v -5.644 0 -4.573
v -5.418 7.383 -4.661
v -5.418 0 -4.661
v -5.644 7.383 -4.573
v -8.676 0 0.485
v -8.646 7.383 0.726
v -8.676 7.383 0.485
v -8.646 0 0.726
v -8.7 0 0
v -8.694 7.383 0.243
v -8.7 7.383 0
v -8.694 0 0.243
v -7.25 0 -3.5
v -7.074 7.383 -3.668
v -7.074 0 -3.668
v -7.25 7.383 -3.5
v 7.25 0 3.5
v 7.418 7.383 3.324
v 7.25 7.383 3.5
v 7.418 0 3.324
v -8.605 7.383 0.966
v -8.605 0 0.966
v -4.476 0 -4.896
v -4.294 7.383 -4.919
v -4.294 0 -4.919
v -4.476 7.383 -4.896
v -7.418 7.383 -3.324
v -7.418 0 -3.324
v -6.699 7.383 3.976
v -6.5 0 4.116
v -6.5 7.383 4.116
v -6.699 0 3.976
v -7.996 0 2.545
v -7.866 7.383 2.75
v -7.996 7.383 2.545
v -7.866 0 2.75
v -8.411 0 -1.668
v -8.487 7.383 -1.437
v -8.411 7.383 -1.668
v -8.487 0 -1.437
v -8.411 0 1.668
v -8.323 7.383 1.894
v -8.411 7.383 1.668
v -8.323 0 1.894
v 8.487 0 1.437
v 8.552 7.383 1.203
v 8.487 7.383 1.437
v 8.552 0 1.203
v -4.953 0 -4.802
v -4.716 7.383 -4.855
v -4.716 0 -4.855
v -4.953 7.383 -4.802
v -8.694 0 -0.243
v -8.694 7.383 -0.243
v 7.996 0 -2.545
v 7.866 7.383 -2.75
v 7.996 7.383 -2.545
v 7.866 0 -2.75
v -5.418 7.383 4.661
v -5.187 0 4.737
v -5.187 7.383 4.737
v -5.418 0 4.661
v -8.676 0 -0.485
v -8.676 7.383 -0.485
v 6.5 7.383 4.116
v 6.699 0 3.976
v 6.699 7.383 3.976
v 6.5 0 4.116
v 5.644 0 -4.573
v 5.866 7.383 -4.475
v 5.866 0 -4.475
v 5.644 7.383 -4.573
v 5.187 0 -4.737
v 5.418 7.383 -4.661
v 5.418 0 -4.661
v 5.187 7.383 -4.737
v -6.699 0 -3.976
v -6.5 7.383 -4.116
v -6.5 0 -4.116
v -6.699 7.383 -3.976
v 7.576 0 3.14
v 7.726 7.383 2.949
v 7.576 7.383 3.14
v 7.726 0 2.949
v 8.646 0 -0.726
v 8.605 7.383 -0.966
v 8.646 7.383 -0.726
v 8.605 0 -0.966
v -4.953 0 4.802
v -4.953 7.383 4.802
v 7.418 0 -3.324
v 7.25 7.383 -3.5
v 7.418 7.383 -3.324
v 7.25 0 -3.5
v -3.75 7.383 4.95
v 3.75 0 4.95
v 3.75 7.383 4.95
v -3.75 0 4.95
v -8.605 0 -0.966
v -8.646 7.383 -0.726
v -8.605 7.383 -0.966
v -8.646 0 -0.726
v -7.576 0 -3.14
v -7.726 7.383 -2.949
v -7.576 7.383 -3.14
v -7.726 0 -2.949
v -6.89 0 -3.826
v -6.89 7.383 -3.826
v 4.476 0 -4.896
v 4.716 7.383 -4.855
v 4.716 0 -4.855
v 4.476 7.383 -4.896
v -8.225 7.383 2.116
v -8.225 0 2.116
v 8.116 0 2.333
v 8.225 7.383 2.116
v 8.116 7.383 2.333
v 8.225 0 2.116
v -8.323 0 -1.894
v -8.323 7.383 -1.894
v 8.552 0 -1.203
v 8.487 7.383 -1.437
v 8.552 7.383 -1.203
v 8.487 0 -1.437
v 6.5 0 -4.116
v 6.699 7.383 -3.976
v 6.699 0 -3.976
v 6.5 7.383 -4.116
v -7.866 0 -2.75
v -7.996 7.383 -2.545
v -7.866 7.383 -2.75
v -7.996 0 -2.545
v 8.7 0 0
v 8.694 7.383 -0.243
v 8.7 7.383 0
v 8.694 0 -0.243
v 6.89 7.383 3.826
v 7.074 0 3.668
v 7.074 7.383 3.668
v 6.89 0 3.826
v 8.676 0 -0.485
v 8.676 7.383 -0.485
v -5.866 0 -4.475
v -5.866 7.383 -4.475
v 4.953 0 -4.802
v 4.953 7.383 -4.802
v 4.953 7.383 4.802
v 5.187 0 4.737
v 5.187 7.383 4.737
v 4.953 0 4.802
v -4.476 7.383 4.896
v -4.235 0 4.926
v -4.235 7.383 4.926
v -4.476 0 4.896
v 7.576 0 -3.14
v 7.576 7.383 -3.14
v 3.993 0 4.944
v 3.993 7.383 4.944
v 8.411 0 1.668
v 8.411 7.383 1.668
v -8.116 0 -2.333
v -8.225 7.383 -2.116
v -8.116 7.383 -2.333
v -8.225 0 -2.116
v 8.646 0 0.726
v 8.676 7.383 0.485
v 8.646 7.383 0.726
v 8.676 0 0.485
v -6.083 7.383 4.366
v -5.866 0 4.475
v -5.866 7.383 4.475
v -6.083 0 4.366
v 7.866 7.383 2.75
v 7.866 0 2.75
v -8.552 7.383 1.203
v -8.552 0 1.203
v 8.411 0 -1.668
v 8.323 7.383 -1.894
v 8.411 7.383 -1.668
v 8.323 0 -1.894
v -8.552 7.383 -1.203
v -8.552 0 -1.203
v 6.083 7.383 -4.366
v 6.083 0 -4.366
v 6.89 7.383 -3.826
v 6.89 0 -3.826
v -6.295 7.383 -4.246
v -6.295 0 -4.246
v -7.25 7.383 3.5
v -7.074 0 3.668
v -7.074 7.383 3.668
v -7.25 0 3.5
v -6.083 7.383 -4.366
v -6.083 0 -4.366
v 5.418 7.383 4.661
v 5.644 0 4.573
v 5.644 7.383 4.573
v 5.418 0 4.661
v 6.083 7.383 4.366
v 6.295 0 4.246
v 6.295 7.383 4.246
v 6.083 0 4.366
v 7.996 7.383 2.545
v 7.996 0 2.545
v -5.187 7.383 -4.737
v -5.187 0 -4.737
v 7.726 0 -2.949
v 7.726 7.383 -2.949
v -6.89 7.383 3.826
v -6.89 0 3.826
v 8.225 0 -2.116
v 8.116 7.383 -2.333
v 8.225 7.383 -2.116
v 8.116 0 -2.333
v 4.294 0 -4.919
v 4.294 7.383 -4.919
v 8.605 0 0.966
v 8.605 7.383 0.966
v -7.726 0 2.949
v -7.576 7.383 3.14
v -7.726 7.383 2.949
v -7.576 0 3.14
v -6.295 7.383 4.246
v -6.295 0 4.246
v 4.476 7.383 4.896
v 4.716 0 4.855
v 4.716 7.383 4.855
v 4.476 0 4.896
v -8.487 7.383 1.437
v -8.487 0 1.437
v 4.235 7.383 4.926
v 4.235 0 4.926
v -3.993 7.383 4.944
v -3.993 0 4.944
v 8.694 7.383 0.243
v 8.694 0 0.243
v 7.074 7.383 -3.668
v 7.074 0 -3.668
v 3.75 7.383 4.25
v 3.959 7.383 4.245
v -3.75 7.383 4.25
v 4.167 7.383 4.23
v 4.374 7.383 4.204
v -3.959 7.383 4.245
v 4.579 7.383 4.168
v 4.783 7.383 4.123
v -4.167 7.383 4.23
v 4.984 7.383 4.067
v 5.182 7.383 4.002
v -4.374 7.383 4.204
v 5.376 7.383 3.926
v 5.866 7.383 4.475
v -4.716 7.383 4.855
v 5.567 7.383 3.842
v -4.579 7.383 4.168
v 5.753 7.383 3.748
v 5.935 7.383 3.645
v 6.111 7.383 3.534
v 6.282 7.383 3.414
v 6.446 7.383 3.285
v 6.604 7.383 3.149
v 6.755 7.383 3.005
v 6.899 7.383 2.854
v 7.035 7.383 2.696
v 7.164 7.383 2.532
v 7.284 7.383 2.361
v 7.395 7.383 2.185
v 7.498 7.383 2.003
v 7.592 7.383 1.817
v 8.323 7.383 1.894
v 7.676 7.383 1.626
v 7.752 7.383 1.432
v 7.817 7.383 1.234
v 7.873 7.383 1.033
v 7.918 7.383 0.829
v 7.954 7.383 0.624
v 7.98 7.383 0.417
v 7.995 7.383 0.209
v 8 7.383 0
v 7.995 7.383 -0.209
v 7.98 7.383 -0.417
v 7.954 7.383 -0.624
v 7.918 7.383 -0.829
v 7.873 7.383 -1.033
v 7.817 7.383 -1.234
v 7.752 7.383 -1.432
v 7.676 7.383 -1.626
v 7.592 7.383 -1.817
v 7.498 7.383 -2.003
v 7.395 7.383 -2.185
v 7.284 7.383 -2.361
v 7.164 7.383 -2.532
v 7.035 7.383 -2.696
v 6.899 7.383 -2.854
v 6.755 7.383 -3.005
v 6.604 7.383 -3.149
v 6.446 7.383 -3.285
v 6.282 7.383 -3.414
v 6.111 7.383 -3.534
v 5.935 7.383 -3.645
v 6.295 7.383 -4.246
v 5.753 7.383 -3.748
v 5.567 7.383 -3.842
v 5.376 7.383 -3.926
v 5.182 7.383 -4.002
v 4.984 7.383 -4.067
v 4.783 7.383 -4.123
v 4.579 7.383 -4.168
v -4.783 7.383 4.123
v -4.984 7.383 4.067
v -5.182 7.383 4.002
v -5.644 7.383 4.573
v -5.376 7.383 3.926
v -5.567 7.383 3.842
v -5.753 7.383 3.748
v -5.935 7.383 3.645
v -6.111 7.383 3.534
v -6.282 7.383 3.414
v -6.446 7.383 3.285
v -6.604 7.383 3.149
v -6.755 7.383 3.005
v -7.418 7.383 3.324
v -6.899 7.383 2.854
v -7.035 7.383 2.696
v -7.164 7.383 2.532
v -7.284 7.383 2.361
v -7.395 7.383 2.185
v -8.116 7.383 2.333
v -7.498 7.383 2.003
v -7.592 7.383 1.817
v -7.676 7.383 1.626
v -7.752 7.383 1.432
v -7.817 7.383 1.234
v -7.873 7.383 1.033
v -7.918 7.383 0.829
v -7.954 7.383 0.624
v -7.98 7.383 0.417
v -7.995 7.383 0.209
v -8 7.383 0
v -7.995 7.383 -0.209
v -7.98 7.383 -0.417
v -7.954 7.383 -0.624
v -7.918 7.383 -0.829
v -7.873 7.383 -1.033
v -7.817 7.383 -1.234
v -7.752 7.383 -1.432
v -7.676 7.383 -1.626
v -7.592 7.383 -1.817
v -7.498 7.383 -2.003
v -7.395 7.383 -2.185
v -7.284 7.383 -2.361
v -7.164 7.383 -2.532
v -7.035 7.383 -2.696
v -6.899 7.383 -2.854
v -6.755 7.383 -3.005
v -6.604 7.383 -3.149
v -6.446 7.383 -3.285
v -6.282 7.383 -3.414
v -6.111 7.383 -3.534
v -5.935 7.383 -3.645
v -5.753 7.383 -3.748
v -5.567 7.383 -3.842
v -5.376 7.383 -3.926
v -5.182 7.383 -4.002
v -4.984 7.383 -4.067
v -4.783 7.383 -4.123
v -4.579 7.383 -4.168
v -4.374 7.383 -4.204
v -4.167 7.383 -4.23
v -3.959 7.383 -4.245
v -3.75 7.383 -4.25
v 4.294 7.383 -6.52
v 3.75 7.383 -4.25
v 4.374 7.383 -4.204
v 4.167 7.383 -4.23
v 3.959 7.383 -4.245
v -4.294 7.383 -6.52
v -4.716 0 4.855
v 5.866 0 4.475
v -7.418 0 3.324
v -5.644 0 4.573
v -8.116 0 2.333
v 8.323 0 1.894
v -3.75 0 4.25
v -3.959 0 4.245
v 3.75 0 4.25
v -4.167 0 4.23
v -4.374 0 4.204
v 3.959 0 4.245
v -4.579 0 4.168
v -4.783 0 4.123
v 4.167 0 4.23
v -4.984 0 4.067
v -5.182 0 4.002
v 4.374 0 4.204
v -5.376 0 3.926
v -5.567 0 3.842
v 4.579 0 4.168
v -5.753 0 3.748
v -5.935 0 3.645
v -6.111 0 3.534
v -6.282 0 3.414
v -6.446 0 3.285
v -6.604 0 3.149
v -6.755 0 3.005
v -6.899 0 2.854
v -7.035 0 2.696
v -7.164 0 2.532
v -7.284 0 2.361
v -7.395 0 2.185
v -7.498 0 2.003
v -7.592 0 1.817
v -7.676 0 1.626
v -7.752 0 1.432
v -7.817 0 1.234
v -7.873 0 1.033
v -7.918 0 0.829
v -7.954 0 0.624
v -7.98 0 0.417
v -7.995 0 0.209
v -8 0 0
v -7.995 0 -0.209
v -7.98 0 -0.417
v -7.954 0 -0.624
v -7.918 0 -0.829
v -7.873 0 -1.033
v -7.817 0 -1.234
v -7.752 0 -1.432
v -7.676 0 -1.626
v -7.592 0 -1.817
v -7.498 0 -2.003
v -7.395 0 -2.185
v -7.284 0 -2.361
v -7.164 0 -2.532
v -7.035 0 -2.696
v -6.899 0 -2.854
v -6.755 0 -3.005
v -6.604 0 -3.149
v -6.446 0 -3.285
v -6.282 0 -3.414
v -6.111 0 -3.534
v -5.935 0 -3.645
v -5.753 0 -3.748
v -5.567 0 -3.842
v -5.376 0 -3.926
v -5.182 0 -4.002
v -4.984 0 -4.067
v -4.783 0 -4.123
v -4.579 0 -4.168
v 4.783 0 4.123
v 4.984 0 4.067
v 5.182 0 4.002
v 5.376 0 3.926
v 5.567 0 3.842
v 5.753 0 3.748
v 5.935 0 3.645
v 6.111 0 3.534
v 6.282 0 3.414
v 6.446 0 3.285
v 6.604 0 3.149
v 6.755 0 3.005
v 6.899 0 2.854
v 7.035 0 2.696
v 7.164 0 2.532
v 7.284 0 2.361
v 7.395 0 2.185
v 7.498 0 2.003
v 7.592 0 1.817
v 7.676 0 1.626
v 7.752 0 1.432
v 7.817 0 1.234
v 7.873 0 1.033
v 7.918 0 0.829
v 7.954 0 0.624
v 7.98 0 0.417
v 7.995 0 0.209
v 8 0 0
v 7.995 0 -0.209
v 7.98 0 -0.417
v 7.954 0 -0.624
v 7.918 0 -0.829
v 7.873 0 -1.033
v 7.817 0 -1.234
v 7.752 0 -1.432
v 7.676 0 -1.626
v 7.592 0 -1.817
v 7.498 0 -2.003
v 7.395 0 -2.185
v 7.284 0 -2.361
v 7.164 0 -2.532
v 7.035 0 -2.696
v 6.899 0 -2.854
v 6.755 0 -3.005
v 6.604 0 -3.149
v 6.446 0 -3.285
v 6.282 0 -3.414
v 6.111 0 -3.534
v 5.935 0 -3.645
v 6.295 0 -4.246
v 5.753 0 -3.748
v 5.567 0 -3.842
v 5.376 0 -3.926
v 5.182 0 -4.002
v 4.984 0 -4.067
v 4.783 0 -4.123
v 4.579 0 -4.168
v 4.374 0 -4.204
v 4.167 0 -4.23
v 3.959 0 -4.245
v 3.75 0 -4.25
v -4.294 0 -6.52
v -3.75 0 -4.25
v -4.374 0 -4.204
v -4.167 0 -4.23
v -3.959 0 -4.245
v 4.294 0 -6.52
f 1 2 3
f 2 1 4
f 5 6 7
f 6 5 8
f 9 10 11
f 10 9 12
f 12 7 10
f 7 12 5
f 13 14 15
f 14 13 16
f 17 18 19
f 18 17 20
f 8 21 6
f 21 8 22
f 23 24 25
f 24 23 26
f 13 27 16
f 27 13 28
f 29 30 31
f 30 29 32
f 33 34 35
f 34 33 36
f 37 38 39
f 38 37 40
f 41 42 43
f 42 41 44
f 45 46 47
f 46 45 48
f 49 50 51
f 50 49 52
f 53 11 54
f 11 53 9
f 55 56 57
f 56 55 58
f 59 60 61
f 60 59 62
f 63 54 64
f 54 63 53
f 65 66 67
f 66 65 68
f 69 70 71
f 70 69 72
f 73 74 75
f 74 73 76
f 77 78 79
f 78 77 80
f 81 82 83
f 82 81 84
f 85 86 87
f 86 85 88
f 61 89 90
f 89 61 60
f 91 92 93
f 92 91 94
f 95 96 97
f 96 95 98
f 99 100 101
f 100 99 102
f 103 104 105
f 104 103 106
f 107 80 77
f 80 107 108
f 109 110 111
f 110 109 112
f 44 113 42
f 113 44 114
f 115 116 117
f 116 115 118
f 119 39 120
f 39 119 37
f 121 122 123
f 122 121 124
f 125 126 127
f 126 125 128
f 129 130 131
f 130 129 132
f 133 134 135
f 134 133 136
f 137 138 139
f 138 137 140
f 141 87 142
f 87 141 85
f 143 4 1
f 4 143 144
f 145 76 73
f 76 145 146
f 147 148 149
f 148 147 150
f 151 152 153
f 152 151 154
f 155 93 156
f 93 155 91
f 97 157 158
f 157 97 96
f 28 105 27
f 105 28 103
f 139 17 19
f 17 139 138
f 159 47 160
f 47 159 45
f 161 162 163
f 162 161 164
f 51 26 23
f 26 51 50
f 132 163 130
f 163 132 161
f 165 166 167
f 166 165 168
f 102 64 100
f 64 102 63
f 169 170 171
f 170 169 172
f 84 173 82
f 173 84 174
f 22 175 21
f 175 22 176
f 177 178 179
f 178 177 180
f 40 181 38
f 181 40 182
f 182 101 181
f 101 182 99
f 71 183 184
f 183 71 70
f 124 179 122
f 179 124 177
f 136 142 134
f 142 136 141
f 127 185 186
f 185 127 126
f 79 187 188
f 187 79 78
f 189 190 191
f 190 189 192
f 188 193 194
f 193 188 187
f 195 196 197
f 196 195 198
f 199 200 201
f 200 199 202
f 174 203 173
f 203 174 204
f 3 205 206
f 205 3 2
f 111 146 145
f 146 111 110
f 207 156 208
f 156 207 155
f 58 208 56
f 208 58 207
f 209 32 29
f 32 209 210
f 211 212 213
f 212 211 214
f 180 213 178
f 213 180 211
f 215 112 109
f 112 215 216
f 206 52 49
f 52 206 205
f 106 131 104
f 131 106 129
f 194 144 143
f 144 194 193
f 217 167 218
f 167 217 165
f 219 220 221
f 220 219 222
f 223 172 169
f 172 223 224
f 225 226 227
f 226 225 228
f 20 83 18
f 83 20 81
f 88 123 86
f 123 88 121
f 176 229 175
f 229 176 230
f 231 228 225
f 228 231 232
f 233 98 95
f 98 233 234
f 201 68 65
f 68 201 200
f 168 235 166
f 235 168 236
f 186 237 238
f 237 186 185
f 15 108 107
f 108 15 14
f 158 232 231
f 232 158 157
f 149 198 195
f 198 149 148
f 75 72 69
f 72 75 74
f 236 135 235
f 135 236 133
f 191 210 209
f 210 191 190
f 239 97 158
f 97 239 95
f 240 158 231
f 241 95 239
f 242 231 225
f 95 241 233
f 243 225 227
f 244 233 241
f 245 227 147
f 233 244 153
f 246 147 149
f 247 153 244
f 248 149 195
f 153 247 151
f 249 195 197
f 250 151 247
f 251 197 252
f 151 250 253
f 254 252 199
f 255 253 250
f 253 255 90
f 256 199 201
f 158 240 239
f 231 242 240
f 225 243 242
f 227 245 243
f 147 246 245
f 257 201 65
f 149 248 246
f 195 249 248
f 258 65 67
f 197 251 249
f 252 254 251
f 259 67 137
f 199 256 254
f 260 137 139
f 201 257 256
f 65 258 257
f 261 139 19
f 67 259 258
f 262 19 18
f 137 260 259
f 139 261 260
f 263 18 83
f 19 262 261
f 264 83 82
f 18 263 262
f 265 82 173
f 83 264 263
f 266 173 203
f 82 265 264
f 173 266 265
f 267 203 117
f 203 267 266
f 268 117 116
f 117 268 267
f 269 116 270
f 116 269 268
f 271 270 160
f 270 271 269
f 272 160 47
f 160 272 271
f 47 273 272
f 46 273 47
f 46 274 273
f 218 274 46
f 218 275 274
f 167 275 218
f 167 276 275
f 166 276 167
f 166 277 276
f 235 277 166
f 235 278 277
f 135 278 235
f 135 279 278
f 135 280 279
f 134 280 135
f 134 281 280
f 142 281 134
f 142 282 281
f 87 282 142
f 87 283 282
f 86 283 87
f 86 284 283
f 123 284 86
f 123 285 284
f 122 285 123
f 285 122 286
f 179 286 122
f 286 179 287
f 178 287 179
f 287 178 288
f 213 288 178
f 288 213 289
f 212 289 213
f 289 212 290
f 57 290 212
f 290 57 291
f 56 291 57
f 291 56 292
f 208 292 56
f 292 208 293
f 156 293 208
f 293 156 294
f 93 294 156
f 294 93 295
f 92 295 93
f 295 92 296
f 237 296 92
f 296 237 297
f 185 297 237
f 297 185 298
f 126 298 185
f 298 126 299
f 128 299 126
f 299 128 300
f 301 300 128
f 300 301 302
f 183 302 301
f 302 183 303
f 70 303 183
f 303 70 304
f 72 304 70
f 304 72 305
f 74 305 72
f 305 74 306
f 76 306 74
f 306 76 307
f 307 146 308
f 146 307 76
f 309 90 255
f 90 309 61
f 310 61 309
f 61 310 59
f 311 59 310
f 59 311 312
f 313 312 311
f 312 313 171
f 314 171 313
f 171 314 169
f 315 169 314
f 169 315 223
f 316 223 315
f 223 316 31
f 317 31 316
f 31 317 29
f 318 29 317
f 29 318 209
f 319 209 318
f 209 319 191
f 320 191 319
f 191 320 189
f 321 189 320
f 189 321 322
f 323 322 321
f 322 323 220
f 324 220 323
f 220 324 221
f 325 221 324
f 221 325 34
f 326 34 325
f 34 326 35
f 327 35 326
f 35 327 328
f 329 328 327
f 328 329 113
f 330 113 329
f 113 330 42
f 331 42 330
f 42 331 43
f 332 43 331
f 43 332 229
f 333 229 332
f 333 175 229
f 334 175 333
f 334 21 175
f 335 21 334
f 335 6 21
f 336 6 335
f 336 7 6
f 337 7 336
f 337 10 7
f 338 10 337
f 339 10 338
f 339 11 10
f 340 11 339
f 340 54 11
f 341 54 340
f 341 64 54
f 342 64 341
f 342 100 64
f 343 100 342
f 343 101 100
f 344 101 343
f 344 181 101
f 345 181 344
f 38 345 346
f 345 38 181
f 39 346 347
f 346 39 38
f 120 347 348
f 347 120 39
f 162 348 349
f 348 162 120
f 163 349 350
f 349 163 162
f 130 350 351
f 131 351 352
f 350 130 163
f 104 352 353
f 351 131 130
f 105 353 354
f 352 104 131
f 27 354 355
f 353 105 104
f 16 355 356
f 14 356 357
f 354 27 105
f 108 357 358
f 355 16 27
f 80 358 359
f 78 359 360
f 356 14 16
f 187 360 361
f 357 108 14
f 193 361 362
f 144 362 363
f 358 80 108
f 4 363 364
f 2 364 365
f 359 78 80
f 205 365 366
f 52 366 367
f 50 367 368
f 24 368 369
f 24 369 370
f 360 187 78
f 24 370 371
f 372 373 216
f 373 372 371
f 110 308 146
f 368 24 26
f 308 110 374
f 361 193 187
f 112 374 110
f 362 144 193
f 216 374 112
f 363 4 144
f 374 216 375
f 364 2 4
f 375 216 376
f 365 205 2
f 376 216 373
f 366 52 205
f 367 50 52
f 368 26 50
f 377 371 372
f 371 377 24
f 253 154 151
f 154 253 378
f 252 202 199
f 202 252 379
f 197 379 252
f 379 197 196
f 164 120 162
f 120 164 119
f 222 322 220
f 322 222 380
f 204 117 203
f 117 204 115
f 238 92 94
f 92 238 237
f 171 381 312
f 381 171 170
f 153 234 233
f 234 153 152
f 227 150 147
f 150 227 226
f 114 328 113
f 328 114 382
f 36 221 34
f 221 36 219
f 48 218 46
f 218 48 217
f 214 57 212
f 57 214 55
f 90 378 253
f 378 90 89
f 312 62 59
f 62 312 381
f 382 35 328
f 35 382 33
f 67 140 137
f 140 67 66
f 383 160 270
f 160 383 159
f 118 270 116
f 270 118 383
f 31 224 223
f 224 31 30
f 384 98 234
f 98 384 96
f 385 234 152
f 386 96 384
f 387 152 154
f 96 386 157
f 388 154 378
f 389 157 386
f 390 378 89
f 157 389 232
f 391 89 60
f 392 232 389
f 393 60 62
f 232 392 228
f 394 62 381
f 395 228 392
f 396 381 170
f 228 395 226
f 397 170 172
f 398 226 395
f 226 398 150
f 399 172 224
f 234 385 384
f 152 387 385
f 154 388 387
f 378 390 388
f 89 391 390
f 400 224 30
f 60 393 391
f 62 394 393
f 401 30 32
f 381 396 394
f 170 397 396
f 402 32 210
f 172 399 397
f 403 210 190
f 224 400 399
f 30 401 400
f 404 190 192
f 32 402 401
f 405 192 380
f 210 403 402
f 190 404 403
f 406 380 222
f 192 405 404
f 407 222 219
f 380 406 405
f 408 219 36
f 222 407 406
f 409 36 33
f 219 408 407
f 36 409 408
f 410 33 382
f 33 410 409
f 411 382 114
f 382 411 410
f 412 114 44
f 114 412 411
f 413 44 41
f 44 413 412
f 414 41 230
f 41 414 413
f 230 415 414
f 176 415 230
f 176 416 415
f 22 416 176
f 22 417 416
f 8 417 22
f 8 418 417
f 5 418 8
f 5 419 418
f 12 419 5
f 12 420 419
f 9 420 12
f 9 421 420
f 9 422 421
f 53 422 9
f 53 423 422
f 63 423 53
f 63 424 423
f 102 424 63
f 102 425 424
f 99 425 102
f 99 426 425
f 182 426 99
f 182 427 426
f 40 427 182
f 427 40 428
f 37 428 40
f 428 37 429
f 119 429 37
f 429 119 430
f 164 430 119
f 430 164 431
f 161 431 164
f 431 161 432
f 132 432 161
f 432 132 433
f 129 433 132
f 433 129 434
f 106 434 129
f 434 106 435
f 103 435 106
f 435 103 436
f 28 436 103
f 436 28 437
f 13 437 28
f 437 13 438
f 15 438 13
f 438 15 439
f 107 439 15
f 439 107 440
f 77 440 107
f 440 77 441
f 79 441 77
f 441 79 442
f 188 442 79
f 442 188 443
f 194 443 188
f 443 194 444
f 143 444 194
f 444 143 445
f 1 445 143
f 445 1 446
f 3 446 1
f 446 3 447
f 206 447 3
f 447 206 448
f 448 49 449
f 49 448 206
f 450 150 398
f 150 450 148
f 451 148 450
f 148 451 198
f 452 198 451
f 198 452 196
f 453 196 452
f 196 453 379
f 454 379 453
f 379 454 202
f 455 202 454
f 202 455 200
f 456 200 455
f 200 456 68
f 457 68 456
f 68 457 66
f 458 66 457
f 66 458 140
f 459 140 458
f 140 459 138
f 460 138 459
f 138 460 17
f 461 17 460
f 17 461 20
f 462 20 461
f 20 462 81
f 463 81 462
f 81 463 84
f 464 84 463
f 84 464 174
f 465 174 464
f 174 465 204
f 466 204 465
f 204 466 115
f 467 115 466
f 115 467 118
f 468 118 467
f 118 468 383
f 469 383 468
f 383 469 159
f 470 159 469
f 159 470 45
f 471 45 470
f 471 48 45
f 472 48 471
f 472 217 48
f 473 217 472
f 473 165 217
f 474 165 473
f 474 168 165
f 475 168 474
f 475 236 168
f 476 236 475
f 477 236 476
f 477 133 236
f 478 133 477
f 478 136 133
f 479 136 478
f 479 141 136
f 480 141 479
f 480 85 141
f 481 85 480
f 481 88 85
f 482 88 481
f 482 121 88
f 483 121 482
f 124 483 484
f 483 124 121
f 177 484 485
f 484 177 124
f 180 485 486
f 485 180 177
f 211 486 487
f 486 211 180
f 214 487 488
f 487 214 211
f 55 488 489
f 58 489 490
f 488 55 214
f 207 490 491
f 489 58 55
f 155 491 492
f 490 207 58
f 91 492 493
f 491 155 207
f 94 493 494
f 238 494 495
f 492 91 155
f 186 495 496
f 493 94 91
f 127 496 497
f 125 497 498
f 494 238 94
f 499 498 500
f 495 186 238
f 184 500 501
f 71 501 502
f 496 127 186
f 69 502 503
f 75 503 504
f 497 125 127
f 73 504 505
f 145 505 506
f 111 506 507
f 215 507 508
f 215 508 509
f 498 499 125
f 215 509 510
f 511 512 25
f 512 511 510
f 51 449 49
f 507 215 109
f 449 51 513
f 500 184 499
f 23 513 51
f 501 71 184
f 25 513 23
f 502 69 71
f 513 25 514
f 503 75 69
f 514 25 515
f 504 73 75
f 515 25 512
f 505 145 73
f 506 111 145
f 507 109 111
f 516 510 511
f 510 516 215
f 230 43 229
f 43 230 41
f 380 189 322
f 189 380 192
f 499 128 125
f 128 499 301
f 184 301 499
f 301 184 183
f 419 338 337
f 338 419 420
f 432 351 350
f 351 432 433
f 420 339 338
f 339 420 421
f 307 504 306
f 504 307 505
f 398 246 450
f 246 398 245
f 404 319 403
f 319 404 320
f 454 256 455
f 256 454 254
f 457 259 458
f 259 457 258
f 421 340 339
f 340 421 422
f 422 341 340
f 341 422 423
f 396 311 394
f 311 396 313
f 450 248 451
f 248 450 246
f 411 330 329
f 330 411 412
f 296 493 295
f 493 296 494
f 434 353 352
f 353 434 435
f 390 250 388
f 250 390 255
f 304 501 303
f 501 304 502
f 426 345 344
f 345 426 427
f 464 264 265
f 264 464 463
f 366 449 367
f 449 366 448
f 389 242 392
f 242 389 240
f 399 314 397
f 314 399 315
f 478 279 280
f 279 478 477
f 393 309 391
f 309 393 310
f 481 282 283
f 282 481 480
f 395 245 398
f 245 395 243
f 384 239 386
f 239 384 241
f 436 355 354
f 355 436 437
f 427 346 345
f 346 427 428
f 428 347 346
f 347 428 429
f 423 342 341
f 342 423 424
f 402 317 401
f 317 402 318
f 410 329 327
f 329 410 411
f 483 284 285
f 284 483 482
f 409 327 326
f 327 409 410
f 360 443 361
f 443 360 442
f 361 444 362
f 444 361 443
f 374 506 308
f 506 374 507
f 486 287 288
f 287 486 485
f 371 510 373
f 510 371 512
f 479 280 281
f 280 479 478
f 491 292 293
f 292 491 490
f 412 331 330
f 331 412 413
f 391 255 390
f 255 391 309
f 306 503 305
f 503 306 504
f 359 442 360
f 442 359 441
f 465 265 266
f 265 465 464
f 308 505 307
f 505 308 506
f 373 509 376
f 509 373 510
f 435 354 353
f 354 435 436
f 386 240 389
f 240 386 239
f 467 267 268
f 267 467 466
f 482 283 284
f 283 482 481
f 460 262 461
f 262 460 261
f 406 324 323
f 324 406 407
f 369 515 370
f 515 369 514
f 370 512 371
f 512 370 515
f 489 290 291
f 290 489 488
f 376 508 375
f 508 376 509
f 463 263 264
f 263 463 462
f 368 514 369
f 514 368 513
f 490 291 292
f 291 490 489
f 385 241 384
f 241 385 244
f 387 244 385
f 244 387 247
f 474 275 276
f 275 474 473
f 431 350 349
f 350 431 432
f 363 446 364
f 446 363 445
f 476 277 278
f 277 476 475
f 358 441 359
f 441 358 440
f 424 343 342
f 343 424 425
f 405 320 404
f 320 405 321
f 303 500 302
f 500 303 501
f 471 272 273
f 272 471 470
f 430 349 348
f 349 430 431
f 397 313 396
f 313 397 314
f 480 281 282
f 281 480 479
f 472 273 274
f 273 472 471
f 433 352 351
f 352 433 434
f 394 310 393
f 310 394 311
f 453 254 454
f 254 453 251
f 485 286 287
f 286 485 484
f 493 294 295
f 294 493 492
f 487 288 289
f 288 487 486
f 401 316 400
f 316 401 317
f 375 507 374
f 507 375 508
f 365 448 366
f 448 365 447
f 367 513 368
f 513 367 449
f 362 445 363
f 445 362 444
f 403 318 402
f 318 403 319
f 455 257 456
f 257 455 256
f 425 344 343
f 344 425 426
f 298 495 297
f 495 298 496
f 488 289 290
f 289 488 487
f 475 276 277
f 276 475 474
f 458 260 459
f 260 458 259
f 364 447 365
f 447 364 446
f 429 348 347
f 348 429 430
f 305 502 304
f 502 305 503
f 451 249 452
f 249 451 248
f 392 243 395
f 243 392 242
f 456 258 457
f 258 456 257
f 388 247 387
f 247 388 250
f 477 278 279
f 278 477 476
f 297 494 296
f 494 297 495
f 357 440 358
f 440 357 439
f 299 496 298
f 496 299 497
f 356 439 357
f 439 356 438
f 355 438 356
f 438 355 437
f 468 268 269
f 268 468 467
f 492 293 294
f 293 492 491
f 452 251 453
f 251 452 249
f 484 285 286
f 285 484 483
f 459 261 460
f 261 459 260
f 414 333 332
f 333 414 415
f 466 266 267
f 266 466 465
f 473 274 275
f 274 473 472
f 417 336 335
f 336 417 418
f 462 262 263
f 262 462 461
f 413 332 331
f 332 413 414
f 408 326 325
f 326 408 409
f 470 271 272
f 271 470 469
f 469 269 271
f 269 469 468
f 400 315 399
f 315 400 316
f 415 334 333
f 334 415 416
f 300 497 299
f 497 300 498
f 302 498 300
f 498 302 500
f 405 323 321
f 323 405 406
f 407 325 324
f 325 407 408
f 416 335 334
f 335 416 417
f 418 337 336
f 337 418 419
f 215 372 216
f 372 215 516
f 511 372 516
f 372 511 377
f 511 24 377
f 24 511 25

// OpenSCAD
// ============================================================
// Type_C_Port_Entrance.scad
//
// Corrected geometry:
//   - Original large rounded sleeve remains unchanged
//   - New smaller extension is added to the OPPOSITE side
//   - Immediate size reduction: NO taper
//   - Small extension fits around metal USB-C input port
//   - Original lower support/key remains under large section
//
// Units: mm
//
// Orientation:
//   X = width
//   Y = depth through assembly
//   Z = height
//
// Layout:
//
//   SMALL NEW ADD-ON         ORIGINAL LARGE SECTION
//   for metal USB-C input    for cable housing / cover opening
//
//        ┌─────────┐         ┌─────────────────────┐
//        │ smaller │─────────│     full size       │
//        └─────────┘         └─────────────────────┘
//
//       negative Y                    positive Y
// ============================================================

$fn = 128;

// ============================================================
// ORIGINAL LARGE SECTION
// ============================================================
//
// This is the existing larger sleeve. It stays constant-size
// across its entire original depth.
// ============================================================

cable_open_w = 16.0;
cable_open_h = 8.5;

large_wall_t = 0.70;

large_outer_w = cable_open_w + large_wall_t * 2;   // 17.40
large_outer_h = cable_open_h + large_wall_t * 2;   // 9.90

// Original measured depth
original_depth = 7.38269;

// ============================================================
// NEW SMALL STEPPED EXTENSION
// ============================================================
//
// This is added immediately at the opposite end of the original
// sleeve. It does NOT gradually taper.
//
// Replace these port-opening dimensions with the actual outside
// measurement of the metal USB-C receptacle for a precise fit.
// ============================================================

metal_port_open_w = 9.4;
metal_port_open_h = 3.7;

small_wall_t = 0.70;

small_outer_w = metal_port_open_w + small_wall_t * 2; // 10.80
small_outer_h = metal_port_open_h + small_wall_t * 2; // 5.10

// Length of the newly added smaller section
small_addon_depth = 3.5;

// ============================================================
// LOWER SUPPORT / KEY
// ============================================================
//
// Original rectangular support remains attached only beneath
// the original full-size sleeve.
// ============================================================

key_w = 8.58742;
key_depth = original_depth;
key_h = 1.65;

// Original section runs from Y = 0 to Y = original_depth
key_center_y = original_depth / 2;

// Key sits below the large sleeve only
key_center_z = -(large_outer_h / 2 + key_h / 2 - 0.08);

// ============================================================
// OPTIONAL FIT CLEARANCE
// ============================================================
//
// Increase metal_port_clearance slightly for printing tolerance.
// For a snug prototype start at 0.15 to 0.25 mm total.
// ============================================================

metal_port_clearance = 0.0;

final_metal_open_w = metal_port_open_w + metal_port_clearance;
final_metal_open_h = metal_port_open_h + metal_port_clearance;

// Bottom Cover opening fits the large section only
bottom_cover_clearance = 0.20;

bottom_cover_slot_w = large_outer_w + bottom_cover_clearance * 2;
bottom_cover_slot_h = large_outer_h + bottom_cover_clearance * 2;

echo("Bottom Cover slot width = ", bottom_cover_slot_w);
echo("Bottom Cover slot height = ", bottom_cover_slot_h);

// ============================================================
// HELPERS
// ============================================================

module rounded_slot_2d(w, h) {
    hull() {
        translate([-(w - h) / 2, 0])
            circle(d = h);

        translate([(w - h) / 2, 0])
            circle(d = h);
    }
}

// Extrude a rounded slot along Y from y_start to y_end.
module rounded_sleeve_y(outer_w, outer_h, inner_w, inner_h, y_start, y_end) {
    difference() {
        translate([0, y_start, 0])
            rotate([-90, 0, 0])
                linear_extrude(height = y_end - y_start)
                    rounded_slot_2d(outer_w, outer_h);

        translate([0, y_start - 0.1, 0])
            rotate([-90, 0, 0])
                linear_extrude(height = y_end - y_start + 0.2)
                    rounded_slot_2d(inner_w, inner_h);
    }
}

// ============================================================
// ORIGINAL FULL-SIZE SLEEVE
// ============================================================
//
// Remains full size for the entire original depth.
// Extends from Y = 0 to positive Y.
// ============================================================

module original_large_sleeve() {
    rounded_sleeve_y(
        large_outer_w,
        large_outer_h,
        cable_open_w,
        cable_open_h,
        0,
        original_depth
    );
}

// ============================================================
// SMALL IMMEDIATE-STEP ADD-ON
// ============================================================
//
// Extends from the opposite side of the original piece:
// Y = -small_addon_depth to Y = 0.
//
// There is an immediate sharp reduction at Y = 0.
// There is deliberately no taper.
// ============================================================

module small_metal_port_addon() {
    rounded_sleeve_y(
        small_outer_w,
        small_outer_h,
        final_metal_open_w,
        final_metal_open_h,
        -small_addon_depth,
        0.02
    );
}

// ============================================================
// LOWER ORIGINAL SUPPORT KEY
// ============================================================

module lower_support_key() {
    translate([
        0,
        key_center_y,
        key_center_z
    ])
        cube(
            [key_w, key_depth, key_h],
            center = true
        );
}

// ============================================================
// FINAL PART
// ============================================================

module type_c_port_entrance() {
    union() {
        original_large_sleeve();
   
        lower_support_key();
    }
}

type_c_port_entrance();

// ============================================================
// BOTTOM COVER SLOT
// ============================================================
//
// The Bottom_Cover slot fits around the large original sleeve:
//
//     usb_open_w = 17.80;
//     usb_open_h = 10.30;
//
// The new smaller stepped extension sits on the opposite side
// and does not change the Bottom_Cover opening size.
// ============================================================
